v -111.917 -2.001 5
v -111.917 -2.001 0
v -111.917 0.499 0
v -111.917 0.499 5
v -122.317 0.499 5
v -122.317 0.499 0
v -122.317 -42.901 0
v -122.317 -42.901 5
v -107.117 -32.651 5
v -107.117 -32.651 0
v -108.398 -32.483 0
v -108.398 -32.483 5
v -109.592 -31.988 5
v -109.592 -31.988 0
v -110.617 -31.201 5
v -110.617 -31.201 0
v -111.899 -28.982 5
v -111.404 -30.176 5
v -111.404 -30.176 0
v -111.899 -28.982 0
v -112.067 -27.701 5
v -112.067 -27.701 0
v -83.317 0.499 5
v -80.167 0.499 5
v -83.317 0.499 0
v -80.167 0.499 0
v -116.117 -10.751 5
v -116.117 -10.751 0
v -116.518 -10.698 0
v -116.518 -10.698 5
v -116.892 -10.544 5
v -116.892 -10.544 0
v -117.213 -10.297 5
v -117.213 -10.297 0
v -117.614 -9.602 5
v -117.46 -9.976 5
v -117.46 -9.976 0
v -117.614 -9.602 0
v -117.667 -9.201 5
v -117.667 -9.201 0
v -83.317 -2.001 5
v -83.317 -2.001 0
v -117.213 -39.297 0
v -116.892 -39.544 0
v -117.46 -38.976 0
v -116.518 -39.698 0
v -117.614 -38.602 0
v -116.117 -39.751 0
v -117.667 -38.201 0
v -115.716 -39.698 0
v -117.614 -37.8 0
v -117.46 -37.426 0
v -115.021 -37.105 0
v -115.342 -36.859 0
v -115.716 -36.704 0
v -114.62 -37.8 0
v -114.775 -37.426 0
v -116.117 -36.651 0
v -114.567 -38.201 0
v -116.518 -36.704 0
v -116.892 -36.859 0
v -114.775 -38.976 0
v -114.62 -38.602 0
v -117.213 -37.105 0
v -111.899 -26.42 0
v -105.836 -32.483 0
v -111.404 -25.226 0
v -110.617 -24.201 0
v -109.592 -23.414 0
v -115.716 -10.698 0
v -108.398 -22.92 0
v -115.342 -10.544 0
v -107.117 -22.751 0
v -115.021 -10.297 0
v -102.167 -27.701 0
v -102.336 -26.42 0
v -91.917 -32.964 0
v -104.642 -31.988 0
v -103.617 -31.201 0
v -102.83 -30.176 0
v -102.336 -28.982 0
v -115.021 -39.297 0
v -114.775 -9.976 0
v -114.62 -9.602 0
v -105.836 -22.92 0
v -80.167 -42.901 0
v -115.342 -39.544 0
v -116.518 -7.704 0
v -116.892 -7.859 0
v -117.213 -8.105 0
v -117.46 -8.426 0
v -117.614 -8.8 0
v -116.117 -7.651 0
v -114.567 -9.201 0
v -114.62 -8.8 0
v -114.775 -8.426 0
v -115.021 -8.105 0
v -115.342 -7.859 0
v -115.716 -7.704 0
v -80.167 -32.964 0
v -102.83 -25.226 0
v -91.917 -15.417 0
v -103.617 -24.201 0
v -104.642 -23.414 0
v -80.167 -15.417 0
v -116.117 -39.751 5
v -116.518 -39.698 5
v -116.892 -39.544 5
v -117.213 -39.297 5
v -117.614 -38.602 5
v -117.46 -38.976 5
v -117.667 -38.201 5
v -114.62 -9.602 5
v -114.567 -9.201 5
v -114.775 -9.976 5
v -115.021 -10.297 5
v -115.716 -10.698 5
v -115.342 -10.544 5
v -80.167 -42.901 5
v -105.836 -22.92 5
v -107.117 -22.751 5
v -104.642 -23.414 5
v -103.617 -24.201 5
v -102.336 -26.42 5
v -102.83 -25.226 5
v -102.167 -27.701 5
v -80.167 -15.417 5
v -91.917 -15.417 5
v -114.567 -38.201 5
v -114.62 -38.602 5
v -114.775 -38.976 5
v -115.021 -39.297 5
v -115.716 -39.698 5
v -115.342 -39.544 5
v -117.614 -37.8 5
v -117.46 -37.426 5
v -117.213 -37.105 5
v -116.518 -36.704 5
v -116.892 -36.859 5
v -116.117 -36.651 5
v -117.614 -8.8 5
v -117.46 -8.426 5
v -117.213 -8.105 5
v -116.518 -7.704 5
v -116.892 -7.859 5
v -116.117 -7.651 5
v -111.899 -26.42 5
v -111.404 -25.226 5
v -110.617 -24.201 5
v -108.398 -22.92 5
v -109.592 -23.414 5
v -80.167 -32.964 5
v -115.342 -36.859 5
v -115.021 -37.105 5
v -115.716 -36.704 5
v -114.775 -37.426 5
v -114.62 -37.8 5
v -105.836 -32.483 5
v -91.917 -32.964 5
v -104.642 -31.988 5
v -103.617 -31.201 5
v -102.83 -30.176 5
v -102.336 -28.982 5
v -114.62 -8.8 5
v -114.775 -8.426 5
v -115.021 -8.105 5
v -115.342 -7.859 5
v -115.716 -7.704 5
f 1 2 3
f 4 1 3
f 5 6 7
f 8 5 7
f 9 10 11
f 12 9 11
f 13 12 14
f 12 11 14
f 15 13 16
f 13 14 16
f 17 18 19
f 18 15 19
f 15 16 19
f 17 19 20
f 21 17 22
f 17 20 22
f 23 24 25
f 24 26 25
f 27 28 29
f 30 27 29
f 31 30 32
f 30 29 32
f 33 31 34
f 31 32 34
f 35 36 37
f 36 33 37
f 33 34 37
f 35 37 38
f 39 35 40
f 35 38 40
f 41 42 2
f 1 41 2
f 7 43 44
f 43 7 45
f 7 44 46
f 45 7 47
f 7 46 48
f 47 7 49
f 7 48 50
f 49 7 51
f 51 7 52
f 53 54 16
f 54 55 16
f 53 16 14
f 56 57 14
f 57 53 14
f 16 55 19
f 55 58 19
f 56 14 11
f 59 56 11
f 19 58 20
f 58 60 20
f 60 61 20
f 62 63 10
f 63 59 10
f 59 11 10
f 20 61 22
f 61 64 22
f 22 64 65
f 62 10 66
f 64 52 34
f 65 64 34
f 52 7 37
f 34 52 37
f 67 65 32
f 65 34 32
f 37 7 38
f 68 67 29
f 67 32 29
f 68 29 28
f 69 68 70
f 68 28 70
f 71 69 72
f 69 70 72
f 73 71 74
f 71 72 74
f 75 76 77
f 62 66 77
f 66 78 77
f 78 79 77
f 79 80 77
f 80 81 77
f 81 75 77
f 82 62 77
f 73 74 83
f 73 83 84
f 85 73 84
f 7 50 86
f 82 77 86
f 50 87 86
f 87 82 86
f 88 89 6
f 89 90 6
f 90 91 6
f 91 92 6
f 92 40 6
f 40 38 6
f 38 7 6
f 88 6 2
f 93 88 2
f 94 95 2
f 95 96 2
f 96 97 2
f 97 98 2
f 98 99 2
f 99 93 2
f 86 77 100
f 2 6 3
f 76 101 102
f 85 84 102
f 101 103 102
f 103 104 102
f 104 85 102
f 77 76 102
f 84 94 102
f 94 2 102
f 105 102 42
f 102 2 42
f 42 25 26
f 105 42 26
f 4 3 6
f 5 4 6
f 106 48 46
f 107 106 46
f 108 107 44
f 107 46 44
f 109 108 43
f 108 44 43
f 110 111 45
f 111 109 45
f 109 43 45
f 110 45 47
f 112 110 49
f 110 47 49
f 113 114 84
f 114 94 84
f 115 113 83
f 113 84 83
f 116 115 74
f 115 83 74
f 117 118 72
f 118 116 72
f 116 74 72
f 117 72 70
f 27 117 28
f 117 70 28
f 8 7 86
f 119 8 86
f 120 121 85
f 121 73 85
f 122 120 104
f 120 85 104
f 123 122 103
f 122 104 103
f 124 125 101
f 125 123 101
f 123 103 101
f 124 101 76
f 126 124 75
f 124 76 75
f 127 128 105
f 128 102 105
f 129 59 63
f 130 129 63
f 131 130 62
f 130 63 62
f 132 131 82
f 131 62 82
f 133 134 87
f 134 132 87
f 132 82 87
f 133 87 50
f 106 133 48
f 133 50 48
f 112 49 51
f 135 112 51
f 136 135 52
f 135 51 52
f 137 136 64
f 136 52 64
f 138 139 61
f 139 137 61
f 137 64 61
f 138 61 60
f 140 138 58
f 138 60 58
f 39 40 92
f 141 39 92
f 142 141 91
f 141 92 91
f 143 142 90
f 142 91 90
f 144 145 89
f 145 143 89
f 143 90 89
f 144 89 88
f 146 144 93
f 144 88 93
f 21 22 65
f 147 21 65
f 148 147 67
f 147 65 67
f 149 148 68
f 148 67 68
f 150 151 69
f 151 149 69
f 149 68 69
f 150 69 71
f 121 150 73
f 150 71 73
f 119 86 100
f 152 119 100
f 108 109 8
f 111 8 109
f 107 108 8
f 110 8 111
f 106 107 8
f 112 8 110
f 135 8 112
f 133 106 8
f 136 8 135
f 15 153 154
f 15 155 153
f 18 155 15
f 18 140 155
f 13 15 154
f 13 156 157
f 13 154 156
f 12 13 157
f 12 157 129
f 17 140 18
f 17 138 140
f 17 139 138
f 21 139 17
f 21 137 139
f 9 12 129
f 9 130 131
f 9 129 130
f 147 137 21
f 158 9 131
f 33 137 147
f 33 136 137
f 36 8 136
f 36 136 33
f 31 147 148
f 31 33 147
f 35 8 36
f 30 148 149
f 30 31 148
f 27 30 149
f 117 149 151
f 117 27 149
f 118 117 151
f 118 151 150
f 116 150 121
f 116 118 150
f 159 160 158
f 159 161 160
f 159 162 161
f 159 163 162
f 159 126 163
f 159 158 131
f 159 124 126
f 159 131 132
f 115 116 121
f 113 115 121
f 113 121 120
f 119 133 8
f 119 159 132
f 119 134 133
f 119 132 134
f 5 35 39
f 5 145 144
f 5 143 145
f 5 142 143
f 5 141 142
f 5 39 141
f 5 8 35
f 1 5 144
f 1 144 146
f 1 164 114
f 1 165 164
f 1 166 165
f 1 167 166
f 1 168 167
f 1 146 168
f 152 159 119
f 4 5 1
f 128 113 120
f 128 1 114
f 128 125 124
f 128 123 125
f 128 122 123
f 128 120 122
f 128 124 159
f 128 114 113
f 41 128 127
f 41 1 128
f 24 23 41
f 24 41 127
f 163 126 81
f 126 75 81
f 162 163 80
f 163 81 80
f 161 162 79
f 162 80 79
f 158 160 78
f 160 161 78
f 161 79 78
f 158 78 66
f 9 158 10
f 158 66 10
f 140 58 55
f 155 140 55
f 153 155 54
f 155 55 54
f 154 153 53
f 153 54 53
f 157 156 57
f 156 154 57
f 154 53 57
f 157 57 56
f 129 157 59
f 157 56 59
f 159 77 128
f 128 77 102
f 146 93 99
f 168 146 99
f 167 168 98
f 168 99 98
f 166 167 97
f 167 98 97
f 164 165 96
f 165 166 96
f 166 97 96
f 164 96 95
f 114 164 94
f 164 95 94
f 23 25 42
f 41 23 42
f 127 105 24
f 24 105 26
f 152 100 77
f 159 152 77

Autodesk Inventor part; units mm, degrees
ref_plane "YZ Plane" through (0, 0, 0) normal (1, 0, 0) x (0, 1, 0)
ref_plane "XZ Plane" through (0, 0, 0) normal (0, 1, 0) x (-1, 0, 0)
ref_plane "XY Plane" through (0, 0, 0) normal (0, 0, 1) x (1, 0, 0)
sketch "Boceto1" plane through (0, 0, 0) normal (0, 0, 1) x (1, 0, 0)
  arc A0 (-116.1173, -7.6512) -> (-117.6673, -9.2012) centre (-116.1173, -9.2012) ccw
  arc A1 (-117.6673, -9.2012) -> (-116.1173, -10.7512) centre (-116.1173, -9.2012) ccw
  arc A2 (-116.1173, -10.7512) -> (-114.5673, -9.2012) centre (-116.1173, -9.2012) ccw
  arc A3 (-114.5673, -9.2012) -> (-116.1173, -7.6512) centre (-116.1173, -9.2012) ccw
  arc A4 (-116.1173, -36.6512) -> (-117.6673, -38.2012) centre (-116.1173, -38.2012) ccw
  arc A5 (-117.6673, -38.2012) -> (-116.1173, -39.7512) centre (-116.1173, -38.2012) ccw
  arc A6 (-116.1173, -39.7512) -> (-114.5673, -38.2012) centre (-116.1173, -38.2012) ccw
  arc A7 (-114.5673, -38.2012) -> (-116.1173, -36.6512) centre (-116.1173, -38.2012) ccw
  arc A8 (-107.1173, -22.7512) -> (-112.0673, -27.7012) centre (-107.1173, -27.7012) ccw
  arc A9 (-112.0673, -27.7012) -> (-107.1173, -32.6512) centre (-107.1173, -27.7012) ccw
  arc A10 (-107.1173, -32.6512) -> (-102.1673, -27.7012) centre (-107.1173, -27.7012) ccw
  arc A11 (-102.1673, -27.7012) -> (-107.1173, -22.7512) centre (-107.1173, -27.7012) ccw
  line L0 (-122.3173, 0.4988) -> (-122.3173, -42.9012)
  line L1 (-122.3173, -42.9012) -> (-80.1673, -42.9012)
  line L2 (-80.1673, -42.9012) -> (-80.1673, -32.9643)
  line L3 (-80.1673, -32.9643) -> (-91.9173, -32.9643)
  line L4 (-91.9173, -32.9643) -> (-91.9173, -15.4172)
  line L5 (-91.9173, -15.4172) -> (-80.1673, -15.4172)
  line L6 (-80.1673, -15.4172) -> (-80.1673, 0.4988)
  line L7 (-80.1673, 0.4988) -> (-83.3173, 0.4988)
  line L8 (-83.3173, 0.4988) -> (-83.3173, -2.0012)
  line L9 (-83.3173, -2.0012) -> (-111.9173, -2.0012)
  line L10 (-111.9173, -2.0012) -> (-111.9173, 0.4988)
  line L11 (-111.9173, 0.4988) -> (-122.3173, 0.4988)
  point P0 (0, 0)
extrude "Extrusión1" add sketch "Boceto1" along normal blind 5
properties part number "carro x lado motor pieza 2parte 2"
